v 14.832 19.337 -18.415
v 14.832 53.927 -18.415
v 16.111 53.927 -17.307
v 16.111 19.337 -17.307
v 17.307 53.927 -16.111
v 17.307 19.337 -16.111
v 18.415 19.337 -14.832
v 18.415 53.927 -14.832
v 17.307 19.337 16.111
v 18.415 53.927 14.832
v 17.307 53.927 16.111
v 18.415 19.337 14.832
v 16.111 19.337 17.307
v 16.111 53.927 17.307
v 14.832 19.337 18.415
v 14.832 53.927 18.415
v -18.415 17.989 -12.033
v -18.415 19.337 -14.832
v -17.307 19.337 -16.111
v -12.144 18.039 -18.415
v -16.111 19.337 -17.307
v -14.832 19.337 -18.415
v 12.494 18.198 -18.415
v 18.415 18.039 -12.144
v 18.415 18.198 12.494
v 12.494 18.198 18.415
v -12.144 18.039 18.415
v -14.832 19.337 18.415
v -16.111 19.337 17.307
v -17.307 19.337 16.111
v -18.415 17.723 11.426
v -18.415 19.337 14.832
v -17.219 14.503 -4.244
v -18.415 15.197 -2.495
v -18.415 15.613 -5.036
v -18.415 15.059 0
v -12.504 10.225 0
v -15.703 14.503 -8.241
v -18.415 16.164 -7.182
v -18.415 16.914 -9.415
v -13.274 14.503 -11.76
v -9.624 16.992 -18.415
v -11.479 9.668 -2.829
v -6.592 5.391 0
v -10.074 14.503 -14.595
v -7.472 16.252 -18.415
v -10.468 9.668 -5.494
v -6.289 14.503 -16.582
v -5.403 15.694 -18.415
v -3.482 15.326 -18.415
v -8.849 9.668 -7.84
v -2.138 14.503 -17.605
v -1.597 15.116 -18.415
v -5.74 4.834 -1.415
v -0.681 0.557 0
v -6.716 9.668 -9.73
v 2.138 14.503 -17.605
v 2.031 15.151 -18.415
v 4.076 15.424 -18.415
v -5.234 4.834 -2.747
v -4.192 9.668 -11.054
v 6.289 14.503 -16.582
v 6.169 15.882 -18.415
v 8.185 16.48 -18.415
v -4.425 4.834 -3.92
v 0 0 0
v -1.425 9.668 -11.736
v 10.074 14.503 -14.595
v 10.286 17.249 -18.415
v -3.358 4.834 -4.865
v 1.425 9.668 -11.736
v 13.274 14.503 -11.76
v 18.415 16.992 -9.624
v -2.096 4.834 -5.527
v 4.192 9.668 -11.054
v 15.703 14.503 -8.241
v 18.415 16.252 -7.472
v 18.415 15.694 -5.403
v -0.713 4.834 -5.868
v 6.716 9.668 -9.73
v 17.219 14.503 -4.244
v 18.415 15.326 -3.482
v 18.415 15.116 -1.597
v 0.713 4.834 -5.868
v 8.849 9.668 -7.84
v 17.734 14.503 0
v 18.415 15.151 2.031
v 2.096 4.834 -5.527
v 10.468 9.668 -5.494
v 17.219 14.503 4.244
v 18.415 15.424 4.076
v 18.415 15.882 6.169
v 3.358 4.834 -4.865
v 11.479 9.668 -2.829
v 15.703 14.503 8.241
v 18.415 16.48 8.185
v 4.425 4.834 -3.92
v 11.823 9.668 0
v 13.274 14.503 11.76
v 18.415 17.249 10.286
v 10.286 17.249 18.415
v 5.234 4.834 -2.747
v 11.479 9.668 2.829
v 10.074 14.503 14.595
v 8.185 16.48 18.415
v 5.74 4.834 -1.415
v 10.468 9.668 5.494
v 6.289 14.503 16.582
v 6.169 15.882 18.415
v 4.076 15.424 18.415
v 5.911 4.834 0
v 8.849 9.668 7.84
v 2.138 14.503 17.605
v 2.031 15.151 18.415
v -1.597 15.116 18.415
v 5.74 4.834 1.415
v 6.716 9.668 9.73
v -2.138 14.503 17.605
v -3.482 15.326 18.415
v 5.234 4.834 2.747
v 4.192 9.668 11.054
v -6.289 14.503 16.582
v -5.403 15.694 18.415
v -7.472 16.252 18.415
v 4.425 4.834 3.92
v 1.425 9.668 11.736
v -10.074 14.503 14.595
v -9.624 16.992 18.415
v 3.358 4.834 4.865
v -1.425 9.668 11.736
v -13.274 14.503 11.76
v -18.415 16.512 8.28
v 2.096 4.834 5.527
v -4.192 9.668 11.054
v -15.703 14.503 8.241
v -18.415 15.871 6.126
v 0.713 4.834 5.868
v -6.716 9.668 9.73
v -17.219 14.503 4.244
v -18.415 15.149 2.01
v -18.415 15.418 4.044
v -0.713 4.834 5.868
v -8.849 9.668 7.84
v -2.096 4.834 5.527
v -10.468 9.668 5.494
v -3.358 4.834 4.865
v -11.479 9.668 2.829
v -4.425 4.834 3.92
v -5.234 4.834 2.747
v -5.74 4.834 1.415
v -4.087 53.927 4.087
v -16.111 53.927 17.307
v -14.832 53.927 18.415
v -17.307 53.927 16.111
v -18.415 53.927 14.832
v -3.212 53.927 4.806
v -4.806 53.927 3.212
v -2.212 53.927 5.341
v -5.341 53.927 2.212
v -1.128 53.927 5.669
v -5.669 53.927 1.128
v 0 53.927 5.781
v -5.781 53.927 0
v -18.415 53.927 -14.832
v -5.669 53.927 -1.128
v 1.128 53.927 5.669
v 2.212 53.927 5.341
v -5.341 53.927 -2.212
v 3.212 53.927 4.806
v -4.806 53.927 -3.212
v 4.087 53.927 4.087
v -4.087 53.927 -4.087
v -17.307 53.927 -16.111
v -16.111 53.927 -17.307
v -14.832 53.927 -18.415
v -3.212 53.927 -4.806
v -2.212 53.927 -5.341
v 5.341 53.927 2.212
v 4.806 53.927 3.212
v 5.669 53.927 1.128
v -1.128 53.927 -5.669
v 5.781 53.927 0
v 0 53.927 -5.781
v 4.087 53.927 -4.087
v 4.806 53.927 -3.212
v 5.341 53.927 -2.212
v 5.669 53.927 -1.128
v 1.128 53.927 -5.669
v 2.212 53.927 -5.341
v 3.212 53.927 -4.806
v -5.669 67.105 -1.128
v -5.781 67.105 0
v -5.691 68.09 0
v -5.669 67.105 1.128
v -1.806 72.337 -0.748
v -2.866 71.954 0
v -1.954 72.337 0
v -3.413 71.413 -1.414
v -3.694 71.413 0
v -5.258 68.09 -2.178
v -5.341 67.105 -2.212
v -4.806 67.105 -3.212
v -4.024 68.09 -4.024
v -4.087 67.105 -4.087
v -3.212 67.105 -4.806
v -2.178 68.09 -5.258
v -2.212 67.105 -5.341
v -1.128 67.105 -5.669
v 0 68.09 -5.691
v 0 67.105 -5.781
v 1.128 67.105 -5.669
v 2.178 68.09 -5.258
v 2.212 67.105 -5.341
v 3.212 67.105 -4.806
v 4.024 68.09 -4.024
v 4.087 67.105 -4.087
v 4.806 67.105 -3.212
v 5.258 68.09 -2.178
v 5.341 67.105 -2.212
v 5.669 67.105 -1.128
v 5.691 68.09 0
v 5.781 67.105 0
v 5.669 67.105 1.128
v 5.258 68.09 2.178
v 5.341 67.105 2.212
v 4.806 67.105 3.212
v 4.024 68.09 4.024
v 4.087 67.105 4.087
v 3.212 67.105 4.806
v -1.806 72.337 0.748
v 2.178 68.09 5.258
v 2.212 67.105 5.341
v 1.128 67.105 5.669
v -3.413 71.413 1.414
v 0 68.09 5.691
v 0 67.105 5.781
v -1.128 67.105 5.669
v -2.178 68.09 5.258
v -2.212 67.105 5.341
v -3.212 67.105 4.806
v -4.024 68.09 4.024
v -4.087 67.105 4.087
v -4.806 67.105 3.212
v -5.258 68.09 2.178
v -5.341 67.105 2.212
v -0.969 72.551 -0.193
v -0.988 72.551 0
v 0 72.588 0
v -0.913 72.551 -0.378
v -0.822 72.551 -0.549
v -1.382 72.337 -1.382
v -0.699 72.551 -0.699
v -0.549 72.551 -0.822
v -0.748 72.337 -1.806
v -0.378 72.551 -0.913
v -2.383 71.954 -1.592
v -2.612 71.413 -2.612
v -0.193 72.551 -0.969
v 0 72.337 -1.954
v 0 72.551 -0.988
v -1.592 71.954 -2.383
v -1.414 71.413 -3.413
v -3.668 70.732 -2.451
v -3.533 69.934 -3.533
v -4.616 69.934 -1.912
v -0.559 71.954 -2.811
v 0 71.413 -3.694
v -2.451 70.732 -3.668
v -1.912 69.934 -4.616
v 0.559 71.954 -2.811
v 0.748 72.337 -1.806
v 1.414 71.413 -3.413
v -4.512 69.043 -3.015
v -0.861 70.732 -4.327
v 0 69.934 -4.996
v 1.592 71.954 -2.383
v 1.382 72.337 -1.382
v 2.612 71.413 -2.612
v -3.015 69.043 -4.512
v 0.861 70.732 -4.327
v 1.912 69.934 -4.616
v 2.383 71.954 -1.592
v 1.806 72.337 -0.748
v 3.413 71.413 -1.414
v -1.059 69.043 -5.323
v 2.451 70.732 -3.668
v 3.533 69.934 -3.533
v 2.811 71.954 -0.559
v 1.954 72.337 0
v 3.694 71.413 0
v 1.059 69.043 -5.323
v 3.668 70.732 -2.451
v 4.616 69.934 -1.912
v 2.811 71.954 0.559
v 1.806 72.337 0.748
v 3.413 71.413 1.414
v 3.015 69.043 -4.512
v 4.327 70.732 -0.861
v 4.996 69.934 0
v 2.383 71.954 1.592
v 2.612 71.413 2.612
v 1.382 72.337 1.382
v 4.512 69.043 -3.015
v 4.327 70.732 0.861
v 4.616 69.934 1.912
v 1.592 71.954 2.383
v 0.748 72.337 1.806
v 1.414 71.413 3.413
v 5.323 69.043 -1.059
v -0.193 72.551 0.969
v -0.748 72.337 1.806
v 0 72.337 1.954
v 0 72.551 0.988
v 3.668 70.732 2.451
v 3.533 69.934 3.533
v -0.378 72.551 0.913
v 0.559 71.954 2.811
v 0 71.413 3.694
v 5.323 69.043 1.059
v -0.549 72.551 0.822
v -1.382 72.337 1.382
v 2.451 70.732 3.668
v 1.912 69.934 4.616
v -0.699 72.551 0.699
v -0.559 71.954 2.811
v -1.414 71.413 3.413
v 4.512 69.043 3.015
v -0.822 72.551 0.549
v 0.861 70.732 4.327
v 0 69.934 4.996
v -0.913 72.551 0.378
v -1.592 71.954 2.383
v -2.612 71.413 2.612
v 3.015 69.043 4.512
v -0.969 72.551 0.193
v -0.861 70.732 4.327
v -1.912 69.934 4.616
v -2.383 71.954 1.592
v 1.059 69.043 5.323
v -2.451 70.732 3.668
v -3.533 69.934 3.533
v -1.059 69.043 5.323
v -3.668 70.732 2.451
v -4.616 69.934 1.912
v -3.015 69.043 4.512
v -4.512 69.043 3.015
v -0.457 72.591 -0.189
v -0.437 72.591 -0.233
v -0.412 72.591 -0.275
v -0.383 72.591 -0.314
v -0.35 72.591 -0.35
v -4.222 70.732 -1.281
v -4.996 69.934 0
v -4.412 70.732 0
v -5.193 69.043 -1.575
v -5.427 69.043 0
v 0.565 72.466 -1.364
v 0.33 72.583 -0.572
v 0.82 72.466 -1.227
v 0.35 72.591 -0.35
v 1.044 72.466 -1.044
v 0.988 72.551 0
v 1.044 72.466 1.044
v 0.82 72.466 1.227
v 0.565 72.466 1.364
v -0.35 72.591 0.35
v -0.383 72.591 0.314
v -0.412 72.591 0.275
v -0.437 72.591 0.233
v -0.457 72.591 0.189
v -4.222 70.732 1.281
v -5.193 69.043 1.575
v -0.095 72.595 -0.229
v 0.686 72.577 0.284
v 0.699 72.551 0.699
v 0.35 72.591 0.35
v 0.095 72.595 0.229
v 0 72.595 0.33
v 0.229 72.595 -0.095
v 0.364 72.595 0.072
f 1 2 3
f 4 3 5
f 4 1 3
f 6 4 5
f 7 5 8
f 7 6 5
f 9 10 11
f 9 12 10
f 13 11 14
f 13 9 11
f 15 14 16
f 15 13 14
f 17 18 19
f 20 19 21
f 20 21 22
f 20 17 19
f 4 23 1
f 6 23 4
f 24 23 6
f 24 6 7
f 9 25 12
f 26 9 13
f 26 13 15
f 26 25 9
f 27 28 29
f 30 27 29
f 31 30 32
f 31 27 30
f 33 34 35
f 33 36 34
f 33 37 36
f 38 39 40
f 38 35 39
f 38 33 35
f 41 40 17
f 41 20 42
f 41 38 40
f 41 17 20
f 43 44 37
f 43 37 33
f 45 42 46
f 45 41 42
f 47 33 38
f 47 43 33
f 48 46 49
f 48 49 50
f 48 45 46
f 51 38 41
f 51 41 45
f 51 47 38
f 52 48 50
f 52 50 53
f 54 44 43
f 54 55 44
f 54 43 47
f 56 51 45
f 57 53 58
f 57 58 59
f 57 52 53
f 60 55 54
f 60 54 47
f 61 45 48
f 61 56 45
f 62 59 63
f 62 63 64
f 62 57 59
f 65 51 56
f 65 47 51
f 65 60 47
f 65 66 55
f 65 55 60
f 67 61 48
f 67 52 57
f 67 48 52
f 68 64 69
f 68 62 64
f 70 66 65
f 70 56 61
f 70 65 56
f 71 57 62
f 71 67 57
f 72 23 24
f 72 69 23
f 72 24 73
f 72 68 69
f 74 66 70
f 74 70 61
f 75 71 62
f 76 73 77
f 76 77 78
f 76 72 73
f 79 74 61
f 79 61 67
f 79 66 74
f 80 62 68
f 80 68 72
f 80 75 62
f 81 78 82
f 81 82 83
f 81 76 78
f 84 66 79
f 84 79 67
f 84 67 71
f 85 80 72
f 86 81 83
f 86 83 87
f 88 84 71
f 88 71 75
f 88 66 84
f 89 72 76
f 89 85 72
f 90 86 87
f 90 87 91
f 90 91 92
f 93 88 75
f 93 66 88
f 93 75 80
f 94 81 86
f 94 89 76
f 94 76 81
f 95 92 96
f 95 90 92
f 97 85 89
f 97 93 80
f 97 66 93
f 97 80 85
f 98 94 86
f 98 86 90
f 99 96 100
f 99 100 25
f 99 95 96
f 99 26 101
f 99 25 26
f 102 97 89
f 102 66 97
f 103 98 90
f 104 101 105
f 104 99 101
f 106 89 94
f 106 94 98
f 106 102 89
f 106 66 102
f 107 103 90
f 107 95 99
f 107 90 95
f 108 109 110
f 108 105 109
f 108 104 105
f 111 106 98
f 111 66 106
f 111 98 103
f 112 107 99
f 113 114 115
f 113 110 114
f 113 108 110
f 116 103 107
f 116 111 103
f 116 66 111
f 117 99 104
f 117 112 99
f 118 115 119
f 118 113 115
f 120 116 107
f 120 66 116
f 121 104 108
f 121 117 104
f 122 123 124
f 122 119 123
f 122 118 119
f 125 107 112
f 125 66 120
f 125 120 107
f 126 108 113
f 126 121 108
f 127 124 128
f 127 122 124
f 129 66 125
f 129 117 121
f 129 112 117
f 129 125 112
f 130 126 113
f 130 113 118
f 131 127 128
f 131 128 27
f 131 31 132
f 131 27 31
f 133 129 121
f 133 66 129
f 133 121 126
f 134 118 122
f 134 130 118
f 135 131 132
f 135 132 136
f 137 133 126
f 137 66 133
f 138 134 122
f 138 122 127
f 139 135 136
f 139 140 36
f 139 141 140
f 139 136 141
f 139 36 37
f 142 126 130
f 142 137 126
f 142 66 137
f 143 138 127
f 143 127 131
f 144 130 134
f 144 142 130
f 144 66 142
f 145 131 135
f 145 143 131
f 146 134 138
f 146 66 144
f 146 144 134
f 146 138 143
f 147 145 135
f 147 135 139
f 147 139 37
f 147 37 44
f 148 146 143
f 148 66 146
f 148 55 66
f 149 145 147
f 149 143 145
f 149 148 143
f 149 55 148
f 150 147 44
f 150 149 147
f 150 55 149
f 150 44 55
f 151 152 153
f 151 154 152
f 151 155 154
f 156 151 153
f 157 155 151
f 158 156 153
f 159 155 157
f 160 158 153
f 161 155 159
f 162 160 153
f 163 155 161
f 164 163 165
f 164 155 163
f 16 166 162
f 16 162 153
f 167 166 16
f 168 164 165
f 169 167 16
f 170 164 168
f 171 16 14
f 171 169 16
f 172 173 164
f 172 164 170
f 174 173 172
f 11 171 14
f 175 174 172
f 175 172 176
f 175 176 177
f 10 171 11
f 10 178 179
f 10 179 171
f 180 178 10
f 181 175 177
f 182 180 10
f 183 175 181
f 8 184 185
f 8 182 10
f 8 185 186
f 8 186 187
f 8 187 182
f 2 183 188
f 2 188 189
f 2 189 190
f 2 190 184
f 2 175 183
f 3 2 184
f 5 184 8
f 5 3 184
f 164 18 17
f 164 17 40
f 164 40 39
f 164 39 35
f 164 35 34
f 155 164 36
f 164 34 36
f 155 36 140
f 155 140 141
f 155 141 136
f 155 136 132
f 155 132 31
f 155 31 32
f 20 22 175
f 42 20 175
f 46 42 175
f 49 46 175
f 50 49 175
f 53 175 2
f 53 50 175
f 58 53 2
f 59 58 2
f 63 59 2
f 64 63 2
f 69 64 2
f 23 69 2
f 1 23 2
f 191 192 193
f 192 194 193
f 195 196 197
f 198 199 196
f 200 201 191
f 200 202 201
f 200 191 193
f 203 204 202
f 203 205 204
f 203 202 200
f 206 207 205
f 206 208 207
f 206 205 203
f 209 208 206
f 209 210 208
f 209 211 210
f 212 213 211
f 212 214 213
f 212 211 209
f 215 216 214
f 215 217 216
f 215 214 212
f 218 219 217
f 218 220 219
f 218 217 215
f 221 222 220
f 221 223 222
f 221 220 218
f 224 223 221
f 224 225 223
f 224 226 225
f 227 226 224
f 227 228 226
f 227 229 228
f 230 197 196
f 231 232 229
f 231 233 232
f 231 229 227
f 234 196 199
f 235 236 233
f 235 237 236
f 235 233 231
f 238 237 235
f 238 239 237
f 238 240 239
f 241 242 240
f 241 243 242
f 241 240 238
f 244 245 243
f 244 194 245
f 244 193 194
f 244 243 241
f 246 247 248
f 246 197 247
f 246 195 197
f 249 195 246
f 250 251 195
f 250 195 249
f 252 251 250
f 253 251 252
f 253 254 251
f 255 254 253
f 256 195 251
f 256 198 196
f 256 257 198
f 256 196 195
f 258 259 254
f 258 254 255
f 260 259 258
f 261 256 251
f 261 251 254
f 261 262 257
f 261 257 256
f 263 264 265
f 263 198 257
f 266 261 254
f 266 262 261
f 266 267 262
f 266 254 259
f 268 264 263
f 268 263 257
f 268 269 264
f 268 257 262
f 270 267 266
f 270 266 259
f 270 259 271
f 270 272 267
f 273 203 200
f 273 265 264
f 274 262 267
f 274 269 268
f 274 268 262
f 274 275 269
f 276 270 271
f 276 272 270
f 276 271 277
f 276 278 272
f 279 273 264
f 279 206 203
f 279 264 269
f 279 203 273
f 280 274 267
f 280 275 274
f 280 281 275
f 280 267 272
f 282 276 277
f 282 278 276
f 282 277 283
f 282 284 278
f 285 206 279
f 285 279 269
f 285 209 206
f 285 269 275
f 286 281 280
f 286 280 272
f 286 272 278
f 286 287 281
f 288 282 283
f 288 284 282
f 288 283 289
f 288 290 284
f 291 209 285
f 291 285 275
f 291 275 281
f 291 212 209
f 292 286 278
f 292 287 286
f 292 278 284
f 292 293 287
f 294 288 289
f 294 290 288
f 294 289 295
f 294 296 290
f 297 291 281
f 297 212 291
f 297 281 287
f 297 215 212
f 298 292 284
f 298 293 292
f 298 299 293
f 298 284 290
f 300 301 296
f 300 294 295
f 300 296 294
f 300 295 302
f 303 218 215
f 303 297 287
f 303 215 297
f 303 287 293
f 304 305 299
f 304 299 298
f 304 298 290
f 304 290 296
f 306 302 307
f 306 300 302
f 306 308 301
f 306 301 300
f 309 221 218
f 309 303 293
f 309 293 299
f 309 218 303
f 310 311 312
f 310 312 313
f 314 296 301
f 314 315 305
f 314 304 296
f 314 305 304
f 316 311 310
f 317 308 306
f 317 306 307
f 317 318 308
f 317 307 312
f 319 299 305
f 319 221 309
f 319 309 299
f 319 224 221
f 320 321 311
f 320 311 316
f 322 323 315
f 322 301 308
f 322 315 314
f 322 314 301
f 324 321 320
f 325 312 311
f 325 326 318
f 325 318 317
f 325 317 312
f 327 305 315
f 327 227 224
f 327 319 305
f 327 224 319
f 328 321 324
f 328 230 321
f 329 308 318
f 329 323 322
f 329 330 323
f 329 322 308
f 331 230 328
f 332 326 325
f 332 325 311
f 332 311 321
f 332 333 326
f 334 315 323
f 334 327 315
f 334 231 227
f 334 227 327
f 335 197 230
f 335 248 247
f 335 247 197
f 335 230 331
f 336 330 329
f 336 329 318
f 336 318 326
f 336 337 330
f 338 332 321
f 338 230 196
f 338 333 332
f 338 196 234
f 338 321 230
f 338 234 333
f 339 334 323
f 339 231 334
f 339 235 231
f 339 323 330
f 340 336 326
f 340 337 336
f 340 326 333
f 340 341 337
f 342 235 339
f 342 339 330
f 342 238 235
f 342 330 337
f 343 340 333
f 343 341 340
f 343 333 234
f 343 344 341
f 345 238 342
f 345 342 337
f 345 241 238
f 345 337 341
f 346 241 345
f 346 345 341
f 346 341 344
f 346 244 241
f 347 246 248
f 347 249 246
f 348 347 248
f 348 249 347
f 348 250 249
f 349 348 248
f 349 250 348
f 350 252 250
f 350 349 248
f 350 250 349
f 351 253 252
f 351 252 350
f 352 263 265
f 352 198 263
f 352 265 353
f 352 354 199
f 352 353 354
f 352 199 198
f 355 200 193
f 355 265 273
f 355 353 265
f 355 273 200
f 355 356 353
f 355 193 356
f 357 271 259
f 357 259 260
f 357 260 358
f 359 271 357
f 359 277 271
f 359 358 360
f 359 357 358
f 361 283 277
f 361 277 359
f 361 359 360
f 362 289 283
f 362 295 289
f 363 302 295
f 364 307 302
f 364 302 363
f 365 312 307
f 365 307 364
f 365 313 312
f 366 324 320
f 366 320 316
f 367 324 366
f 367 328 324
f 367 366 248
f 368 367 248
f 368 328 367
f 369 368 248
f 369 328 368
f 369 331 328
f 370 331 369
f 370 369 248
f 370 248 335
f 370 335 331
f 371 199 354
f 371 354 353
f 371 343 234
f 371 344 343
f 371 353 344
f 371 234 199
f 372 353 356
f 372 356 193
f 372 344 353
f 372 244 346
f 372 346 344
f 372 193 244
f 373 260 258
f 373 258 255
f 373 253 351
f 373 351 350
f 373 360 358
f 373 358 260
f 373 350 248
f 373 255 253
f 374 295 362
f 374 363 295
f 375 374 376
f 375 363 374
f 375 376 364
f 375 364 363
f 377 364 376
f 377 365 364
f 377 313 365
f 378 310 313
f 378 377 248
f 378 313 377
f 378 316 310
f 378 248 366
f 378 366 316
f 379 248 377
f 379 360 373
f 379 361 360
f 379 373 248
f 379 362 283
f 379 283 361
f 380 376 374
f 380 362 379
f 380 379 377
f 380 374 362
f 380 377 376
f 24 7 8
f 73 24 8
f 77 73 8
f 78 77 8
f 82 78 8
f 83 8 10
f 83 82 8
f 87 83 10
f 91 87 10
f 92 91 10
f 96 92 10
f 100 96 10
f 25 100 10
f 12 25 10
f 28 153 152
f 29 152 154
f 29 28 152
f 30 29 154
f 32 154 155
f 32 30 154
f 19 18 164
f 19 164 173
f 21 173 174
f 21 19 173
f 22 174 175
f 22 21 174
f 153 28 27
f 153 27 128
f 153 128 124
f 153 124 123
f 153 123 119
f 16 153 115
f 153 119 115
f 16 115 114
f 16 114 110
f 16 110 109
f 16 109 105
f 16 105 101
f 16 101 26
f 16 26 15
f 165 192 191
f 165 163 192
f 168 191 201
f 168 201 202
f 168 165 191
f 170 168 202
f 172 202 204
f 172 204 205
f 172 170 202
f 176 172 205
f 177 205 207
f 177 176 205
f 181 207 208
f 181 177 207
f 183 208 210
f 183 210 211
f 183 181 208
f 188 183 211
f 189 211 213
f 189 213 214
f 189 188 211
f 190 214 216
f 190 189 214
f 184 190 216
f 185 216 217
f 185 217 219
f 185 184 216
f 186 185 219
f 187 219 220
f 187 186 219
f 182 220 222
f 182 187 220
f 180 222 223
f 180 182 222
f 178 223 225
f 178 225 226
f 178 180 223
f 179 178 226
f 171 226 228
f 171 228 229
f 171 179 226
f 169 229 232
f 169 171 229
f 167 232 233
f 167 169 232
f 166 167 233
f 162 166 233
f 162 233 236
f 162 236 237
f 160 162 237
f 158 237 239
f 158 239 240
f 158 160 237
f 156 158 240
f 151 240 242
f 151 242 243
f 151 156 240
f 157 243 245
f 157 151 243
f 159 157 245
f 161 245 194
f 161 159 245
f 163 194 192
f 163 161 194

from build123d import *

# Parameters (mm, degrees)
F2_W     = 83.072104
F2_H     = 76.524554
F2_W_2   = 36.83
F2_H_2   = 36.83
F3_DEPTH = 81.534


with BuildPart() as f1:
    # F0 (on Top) → F1 (revolve)
    with BuildSketch(Plane.XY):
        with BuildLine():
            Line((-5.780561, 67.105159), (-5.780561, 53.927373))
            Line((-5.780561, 53.927373), (-23.645375, 53.927373))
            Line((-23.645375, 53.927373), (-23.645375, 19.336753))
            Line((-23.645375, 19.336753), (0, 0))
            Line((0, 0), (0, 67.846416))
            Line((0, 67.846416), (0, 72.587589))
            ThreePointArc((0, 72.587589), (-4.06846, 71.088622), (-5.780561, 67.105159))
        make_face()
    revolve(axis=Axis((0, 33.923208, 0), (0, -1, 0)))

    # F2 (on Front) → F3 (cut)
    with BuildSketch(Plane.XZ):
        Rectangle(F2_W, F2_H)
        Rectangle(F2_W_2, F2_H_2, mode=Mode.SUBTRACT)
    extrude(amount=-F3_DEPTH, mode=Mode.SUBTRACT)


solid = f1.part
